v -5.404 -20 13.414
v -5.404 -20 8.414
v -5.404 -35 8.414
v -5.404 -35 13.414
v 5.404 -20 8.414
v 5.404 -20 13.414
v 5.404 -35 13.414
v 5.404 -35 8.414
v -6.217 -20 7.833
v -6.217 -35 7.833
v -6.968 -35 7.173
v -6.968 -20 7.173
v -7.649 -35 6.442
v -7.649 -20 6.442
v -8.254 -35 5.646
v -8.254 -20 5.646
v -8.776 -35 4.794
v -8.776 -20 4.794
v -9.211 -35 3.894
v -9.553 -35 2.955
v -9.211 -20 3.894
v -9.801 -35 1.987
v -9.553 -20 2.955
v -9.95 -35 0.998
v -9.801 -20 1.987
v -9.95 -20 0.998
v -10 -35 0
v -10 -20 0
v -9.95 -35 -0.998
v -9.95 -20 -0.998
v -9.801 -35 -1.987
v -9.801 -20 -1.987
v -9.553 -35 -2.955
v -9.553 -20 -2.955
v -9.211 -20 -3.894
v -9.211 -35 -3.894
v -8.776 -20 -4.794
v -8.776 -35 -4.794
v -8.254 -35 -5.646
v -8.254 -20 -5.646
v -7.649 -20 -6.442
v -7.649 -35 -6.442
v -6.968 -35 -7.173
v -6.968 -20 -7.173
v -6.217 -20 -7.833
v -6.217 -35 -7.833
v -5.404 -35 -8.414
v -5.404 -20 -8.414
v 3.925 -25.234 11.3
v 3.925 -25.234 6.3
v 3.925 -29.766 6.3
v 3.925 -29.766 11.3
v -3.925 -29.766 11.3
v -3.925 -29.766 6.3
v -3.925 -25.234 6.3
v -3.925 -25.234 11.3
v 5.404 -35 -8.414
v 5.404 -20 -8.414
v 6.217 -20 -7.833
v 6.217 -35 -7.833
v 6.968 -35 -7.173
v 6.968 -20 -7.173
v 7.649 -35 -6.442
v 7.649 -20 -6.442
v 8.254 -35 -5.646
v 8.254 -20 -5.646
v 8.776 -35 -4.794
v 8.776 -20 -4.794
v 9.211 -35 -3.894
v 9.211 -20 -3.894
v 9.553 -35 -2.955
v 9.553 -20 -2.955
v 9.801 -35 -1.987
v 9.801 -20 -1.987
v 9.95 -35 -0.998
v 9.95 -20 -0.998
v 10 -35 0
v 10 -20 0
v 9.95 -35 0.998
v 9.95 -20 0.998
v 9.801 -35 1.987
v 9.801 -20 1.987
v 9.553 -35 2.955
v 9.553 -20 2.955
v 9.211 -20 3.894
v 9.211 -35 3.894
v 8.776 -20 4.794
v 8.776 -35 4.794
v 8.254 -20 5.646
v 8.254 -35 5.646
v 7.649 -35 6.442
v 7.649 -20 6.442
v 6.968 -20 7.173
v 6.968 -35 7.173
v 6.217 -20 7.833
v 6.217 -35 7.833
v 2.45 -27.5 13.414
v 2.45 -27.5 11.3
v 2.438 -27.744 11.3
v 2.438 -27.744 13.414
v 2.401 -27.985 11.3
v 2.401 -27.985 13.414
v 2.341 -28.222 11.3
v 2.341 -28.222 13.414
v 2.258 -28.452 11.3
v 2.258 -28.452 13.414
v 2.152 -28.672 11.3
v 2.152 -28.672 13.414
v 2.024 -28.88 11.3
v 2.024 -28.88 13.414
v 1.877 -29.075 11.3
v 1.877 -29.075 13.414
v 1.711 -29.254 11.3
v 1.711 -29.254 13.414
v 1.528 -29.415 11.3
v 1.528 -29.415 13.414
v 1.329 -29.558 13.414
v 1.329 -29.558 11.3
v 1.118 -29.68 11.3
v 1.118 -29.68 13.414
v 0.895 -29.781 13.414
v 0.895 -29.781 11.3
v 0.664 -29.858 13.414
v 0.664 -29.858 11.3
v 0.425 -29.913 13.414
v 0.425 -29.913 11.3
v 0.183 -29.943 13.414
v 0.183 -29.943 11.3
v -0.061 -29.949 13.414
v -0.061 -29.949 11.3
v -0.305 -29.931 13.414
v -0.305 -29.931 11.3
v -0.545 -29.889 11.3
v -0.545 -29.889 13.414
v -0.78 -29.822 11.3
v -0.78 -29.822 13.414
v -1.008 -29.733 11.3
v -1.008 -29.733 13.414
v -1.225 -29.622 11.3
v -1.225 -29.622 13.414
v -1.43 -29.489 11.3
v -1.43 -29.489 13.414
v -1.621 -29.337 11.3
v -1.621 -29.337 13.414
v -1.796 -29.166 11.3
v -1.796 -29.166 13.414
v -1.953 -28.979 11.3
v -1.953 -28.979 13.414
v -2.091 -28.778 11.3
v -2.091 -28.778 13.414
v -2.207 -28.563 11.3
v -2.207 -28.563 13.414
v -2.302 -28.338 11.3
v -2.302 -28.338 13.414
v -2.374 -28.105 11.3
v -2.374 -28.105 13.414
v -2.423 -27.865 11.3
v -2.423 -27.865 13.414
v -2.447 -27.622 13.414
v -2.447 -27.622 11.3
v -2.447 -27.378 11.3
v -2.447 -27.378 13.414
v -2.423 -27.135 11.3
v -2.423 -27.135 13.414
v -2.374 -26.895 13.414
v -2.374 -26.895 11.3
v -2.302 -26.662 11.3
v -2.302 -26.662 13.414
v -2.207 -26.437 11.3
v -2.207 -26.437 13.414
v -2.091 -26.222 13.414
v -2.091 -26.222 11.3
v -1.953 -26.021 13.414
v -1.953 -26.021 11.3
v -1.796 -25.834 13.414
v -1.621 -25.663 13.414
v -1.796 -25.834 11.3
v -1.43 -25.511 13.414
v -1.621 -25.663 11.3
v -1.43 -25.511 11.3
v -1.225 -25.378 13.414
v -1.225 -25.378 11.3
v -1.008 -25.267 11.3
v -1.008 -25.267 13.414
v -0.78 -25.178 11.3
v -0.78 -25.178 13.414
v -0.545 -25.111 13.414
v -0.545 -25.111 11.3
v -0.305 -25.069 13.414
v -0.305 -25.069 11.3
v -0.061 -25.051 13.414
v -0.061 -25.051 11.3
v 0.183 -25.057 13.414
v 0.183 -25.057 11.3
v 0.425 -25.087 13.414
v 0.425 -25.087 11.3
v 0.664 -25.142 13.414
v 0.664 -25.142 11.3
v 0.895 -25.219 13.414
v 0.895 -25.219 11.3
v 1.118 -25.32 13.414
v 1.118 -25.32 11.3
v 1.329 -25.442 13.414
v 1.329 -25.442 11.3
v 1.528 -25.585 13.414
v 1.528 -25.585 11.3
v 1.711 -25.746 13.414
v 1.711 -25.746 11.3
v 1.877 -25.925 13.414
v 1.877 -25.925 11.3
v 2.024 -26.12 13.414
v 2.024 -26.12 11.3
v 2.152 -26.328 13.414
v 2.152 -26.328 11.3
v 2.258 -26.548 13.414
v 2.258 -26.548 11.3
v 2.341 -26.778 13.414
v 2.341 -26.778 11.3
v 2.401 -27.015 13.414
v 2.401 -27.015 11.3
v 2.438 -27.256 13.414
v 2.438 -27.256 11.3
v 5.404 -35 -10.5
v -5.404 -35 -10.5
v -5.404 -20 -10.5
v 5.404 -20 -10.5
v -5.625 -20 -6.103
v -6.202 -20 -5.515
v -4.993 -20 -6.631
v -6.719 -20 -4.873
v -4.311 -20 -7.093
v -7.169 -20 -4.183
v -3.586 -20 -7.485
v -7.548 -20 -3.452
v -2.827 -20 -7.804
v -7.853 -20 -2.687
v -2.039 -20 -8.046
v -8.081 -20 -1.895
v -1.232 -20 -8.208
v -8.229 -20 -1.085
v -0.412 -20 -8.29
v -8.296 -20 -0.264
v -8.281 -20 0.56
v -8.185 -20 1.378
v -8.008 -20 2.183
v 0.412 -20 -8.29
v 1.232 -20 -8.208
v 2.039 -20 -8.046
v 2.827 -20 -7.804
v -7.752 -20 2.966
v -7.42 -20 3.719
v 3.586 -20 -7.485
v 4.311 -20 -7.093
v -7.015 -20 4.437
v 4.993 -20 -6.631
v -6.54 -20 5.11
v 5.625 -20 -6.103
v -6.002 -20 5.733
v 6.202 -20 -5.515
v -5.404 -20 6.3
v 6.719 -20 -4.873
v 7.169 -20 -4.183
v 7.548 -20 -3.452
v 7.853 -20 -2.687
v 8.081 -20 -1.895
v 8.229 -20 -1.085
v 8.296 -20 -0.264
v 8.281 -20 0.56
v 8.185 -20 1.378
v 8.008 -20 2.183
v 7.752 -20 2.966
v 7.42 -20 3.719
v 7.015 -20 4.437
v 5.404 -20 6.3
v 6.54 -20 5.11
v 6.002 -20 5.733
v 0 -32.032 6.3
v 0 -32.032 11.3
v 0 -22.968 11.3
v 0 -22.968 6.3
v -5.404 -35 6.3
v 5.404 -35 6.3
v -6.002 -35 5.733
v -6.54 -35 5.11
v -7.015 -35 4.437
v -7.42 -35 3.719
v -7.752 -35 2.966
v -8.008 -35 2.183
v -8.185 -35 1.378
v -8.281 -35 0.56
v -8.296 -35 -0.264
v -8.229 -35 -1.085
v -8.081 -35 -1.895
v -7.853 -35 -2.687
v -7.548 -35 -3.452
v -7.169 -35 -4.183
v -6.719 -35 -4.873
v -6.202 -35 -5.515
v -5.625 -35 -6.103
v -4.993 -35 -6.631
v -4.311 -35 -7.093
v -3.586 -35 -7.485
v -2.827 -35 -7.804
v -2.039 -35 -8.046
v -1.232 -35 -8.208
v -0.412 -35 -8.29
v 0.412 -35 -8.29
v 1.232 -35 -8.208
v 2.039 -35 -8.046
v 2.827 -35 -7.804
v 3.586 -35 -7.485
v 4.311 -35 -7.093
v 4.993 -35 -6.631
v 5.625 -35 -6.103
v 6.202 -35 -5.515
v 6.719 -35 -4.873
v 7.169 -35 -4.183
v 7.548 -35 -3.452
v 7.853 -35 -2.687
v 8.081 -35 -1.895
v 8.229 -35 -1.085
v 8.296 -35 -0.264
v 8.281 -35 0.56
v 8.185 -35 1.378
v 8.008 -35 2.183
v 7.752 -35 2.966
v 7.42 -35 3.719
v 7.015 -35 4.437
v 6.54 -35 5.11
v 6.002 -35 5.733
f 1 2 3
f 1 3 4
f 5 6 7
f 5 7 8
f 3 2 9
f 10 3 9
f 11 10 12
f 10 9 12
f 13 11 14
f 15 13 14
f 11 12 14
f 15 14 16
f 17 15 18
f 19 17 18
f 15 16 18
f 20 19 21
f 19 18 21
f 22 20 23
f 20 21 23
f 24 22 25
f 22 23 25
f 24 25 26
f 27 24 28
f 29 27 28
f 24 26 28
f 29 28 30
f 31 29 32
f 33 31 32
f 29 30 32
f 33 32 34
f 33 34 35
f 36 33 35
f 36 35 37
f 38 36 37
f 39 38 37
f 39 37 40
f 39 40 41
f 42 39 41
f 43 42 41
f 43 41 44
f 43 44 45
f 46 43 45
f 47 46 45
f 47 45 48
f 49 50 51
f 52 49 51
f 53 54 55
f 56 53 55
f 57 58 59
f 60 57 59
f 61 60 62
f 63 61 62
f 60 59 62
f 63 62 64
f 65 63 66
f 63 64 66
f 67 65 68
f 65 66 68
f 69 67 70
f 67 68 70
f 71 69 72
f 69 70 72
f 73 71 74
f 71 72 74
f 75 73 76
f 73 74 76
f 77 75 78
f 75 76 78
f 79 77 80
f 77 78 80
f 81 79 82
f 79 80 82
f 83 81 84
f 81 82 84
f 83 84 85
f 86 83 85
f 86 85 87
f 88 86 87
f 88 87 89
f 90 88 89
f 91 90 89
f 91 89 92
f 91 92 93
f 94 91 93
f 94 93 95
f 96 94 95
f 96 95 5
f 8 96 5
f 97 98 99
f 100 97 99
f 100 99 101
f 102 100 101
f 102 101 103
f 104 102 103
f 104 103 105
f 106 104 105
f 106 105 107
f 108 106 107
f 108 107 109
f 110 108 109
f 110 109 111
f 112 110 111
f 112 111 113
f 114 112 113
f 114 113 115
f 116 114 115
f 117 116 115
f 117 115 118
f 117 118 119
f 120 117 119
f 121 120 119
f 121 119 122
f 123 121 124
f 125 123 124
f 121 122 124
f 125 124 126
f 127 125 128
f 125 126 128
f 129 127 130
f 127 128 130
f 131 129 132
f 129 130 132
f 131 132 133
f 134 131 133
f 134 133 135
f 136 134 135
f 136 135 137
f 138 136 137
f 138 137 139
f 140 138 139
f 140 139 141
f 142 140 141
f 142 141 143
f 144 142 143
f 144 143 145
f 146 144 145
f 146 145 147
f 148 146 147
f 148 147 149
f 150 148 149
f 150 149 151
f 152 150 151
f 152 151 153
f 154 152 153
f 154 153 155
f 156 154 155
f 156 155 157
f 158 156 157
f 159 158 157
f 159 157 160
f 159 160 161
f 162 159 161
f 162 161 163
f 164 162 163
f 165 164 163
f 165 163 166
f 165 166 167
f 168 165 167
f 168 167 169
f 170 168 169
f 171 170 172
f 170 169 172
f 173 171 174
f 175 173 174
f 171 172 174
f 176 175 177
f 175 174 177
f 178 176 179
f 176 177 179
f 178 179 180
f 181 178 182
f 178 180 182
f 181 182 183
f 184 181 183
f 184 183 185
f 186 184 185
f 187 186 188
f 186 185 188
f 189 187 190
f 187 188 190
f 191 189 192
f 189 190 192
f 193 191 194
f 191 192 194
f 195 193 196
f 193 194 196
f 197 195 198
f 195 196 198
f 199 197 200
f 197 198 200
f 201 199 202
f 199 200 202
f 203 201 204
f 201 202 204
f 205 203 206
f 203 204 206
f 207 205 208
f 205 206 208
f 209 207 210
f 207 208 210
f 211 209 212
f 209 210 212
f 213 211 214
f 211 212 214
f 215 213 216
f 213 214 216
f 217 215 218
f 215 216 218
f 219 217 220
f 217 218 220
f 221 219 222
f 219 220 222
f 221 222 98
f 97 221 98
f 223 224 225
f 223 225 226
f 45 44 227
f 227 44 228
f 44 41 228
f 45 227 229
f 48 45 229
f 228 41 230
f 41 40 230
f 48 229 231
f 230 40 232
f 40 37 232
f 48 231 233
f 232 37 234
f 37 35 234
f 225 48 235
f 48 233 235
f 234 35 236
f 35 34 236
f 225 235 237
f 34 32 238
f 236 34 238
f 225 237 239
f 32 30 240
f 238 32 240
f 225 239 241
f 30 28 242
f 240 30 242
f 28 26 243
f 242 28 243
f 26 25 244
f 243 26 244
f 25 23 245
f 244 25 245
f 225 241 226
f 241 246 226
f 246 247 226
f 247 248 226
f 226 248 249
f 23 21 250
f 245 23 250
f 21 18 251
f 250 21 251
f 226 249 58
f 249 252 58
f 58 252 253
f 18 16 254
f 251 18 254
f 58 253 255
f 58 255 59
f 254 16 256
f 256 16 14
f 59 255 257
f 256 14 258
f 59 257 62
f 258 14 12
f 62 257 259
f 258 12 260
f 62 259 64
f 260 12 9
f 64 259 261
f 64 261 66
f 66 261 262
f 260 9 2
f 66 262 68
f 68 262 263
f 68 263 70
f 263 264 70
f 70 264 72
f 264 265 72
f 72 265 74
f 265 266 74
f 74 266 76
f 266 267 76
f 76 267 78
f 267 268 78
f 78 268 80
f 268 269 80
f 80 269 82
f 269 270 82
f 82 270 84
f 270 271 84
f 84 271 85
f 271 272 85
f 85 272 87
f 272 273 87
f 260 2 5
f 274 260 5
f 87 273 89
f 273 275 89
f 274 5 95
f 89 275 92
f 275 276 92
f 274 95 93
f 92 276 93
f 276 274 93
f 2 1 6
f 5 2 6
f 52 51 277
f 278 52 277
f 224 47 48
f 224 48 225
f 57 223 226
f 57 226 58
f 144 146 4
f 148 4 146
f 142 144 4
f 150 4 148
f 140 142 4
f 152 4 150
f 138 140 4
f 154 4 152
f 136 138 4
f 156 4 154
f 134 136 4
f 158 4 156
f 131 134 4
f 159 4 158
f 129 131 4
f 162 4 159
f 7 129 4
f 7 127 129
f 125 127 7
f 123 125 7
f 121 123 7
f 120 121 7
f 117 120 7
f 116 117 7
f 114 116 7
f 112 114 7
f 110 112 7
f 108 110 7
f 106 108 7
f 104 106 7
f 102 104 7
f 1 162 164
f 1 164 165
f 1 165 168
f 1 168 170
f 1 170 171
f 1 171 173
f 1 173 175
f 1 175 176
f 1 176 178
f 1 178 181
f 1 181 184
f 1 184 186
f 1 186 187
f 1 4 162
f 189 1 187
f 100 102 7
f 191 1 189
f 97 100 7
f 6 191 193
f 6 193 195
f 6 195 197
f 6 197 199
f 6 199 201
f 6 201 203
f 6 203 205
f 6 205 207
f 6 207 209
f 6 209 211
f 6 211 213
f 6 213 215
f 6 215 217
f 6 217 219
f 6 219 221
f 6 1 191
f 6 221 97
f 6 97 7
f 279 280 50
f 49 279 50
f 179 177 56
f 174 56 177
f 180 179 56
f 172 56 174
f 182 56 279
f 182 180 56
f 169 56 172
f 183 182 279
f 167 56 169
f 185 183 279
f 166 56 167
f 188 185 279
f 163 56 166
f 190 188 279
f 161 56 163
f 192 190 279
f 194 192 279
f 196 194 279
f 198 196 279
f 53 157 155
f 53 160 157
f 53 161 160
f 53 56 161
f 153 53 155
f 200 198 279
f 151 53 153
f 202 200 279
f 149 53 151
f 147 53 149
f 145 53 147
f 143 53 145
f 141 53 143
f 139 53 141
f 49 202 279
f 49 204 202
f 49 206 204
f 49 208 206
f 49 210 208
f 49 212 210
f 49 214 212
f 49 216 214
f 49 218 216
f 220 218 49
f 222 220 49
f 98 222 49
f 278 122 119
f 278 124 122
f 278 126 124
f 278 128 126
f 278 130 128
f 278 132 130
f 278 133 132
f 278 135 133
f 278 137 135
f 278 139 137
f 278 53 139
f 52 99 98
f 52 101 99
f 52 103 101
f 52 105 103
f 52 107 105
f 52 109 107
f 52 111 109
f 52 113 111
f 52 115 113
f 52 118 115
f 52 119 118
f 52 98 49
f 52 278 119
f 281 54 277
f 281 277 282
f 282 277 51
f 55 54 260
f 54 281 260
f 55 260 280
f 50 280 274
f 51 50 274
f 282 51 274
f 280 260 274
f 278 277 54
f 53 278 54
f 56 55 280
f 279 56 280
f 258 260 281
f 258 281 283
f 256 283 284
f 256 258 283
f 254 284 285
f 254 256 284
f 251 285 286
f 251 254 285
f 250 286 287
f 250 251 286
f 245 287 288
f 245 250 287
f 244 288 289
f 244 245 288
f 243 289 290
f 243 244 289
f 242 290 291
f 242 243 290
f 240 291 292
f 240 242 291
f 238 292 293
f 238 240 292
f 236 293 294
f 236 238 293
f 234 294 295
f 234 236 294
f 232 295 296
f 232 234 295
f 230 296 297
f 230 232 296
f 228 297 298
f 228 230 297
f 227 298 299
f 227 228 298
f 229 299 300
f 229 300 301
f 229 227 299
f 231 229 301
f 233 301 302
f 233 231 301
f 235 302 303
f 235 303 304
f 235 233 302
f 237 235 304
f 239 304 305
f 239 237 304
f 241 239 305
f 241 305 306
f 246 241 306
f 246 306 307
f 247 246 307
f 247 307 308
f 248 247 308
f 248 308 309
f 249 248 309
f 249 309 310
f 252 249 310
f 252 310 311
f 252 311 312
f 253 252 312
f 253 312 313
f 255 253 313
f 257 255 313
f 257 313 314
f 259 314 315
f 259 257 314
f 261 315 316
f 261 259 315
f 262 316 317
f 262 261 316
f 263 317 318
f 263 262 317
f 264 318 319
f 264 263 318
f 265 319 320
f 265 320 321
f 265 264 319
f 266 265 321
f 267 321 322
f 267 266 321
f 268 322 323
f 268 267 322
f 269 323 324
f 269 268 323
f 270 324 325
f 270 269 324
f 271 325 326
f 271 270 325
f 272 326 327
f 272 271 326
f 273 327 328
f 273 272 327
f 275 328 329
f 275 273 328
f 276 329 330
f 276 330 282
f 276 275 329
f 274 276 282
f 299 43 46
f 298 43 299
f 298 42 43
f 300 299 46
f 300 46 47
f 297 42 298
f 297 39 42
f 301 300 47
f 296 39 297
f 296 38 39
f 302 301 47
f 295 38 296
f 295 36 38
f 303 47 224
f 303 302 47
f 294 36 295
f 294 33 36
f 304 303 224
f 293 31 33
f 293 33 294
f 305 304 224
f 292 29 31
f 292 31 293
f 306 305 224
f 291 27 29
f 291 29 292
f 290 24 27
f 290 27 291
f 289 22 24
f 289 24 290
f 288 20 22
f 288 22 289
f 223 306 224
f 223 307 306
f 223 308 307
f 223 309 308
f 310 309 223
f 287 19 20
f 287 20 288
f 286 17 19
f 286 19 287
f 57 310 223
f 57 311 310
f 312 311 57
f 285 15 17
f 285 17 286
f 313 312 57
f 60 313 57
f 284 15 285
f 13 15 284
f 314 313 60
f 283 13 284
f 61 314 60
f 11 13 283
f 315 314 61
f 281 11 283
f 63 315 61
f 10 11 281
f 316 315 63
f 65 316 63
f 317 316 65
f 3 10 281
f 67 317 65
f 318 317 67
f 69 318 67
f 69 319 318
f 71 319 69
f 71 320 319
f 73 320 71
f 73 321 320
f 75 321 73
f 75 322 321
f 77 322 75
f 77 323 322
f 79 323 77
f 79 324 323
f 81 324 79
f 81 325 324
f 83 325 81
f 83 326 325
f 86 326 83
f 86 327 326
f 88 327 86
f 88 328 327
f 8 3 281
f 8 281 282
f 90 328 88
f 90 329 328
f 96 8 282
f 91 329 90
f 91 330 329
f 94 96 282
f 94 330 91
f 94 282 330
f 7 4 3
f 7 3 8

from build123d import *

# Parameters (mm, degrees)
PAD002_DEPTH    = 15
POCKET_DEPTH    = 5
SKETCH007_R     = 2.45
POCKET001_DEPTH = 2.115274
PAD003_DEPTH    = 15


with BuildPart() as part:
    # Sketch002 (on DatumPlane) → Pad002 (new body)
    with BuildSketch(Plane.XZ.offset(20)):
        with BuildLine():
            ThreePointArc((-5.403702, 8.414274), (0, -10), (5.403702, 8.414274))
            Line((5.403702, 13.414274), (5.403702, 8.414274))
            Line((-5.403702, 13.414274), (5.403702, 13.414274))
            Line((-5.403702, 8.414274), (-5.403702, 13.414274))
        make_face()
        with BuildLine():
            ThreePointArc((-5.403702, 6.3), (0, -8.3), (5.403702, 6.3))
            Line((-5.403702, 6.3), (5.403702, 6.3))
        make_face(mode=Mode.SUBTRACT)
    extrude(amount=PAD002_DEPTH)

    # Sketch006 (on Face6 of Pad002) → Pocket (cut)
    with BuildSketch(Plane(origin=(0, -20, 6.3), x_dir=(1, 0, 0), z_dir=(0, 0, -1))):
        Polygon((-3.925, 9.7661), (-3.925, 5.2339), (0, 2.9678), (3.925, 5.2339), (3.925, 9.7661), (0, 12.0322), align=None)
    extrude(amount=-POCKET_DEPTH, mode=Mode.SUBTRACT)

    # Sketch007 (on Face15 of Pocket) → Pocket001 (cut, through all)
    with BuildSketch(Plane(origin=(0, -20, 11.3), x_dir=(1, 0, 0), z_dir=(0, 0, -1))):
        with Locations((0, 7.5)):
            Circle(SKETCH007_R)
    extrude(amount=-POCKET001_DEPTH, mode=Mode.SUBTRACT)

    # Sketch008 (on Face5 of Pocket001) → Pad003 (join)
    with BuildSketch(Plane.XZ.offset(35)):
        with BuildLine():
            Line((-5.403702, -8.414274), (-5.403702, -10.5))
            Line((-5.403702, -10.5), (5.403702, -10.5))
            Line((5.403702, -10.5), (5.403702, -8.414274))
            ThreePointArc((-5.403702, -8.414274), (0, -10), (5.403702, -8.414274))
        make_face()
    extrude(amount=-PAD003_DEPTH)


solid = part.part
